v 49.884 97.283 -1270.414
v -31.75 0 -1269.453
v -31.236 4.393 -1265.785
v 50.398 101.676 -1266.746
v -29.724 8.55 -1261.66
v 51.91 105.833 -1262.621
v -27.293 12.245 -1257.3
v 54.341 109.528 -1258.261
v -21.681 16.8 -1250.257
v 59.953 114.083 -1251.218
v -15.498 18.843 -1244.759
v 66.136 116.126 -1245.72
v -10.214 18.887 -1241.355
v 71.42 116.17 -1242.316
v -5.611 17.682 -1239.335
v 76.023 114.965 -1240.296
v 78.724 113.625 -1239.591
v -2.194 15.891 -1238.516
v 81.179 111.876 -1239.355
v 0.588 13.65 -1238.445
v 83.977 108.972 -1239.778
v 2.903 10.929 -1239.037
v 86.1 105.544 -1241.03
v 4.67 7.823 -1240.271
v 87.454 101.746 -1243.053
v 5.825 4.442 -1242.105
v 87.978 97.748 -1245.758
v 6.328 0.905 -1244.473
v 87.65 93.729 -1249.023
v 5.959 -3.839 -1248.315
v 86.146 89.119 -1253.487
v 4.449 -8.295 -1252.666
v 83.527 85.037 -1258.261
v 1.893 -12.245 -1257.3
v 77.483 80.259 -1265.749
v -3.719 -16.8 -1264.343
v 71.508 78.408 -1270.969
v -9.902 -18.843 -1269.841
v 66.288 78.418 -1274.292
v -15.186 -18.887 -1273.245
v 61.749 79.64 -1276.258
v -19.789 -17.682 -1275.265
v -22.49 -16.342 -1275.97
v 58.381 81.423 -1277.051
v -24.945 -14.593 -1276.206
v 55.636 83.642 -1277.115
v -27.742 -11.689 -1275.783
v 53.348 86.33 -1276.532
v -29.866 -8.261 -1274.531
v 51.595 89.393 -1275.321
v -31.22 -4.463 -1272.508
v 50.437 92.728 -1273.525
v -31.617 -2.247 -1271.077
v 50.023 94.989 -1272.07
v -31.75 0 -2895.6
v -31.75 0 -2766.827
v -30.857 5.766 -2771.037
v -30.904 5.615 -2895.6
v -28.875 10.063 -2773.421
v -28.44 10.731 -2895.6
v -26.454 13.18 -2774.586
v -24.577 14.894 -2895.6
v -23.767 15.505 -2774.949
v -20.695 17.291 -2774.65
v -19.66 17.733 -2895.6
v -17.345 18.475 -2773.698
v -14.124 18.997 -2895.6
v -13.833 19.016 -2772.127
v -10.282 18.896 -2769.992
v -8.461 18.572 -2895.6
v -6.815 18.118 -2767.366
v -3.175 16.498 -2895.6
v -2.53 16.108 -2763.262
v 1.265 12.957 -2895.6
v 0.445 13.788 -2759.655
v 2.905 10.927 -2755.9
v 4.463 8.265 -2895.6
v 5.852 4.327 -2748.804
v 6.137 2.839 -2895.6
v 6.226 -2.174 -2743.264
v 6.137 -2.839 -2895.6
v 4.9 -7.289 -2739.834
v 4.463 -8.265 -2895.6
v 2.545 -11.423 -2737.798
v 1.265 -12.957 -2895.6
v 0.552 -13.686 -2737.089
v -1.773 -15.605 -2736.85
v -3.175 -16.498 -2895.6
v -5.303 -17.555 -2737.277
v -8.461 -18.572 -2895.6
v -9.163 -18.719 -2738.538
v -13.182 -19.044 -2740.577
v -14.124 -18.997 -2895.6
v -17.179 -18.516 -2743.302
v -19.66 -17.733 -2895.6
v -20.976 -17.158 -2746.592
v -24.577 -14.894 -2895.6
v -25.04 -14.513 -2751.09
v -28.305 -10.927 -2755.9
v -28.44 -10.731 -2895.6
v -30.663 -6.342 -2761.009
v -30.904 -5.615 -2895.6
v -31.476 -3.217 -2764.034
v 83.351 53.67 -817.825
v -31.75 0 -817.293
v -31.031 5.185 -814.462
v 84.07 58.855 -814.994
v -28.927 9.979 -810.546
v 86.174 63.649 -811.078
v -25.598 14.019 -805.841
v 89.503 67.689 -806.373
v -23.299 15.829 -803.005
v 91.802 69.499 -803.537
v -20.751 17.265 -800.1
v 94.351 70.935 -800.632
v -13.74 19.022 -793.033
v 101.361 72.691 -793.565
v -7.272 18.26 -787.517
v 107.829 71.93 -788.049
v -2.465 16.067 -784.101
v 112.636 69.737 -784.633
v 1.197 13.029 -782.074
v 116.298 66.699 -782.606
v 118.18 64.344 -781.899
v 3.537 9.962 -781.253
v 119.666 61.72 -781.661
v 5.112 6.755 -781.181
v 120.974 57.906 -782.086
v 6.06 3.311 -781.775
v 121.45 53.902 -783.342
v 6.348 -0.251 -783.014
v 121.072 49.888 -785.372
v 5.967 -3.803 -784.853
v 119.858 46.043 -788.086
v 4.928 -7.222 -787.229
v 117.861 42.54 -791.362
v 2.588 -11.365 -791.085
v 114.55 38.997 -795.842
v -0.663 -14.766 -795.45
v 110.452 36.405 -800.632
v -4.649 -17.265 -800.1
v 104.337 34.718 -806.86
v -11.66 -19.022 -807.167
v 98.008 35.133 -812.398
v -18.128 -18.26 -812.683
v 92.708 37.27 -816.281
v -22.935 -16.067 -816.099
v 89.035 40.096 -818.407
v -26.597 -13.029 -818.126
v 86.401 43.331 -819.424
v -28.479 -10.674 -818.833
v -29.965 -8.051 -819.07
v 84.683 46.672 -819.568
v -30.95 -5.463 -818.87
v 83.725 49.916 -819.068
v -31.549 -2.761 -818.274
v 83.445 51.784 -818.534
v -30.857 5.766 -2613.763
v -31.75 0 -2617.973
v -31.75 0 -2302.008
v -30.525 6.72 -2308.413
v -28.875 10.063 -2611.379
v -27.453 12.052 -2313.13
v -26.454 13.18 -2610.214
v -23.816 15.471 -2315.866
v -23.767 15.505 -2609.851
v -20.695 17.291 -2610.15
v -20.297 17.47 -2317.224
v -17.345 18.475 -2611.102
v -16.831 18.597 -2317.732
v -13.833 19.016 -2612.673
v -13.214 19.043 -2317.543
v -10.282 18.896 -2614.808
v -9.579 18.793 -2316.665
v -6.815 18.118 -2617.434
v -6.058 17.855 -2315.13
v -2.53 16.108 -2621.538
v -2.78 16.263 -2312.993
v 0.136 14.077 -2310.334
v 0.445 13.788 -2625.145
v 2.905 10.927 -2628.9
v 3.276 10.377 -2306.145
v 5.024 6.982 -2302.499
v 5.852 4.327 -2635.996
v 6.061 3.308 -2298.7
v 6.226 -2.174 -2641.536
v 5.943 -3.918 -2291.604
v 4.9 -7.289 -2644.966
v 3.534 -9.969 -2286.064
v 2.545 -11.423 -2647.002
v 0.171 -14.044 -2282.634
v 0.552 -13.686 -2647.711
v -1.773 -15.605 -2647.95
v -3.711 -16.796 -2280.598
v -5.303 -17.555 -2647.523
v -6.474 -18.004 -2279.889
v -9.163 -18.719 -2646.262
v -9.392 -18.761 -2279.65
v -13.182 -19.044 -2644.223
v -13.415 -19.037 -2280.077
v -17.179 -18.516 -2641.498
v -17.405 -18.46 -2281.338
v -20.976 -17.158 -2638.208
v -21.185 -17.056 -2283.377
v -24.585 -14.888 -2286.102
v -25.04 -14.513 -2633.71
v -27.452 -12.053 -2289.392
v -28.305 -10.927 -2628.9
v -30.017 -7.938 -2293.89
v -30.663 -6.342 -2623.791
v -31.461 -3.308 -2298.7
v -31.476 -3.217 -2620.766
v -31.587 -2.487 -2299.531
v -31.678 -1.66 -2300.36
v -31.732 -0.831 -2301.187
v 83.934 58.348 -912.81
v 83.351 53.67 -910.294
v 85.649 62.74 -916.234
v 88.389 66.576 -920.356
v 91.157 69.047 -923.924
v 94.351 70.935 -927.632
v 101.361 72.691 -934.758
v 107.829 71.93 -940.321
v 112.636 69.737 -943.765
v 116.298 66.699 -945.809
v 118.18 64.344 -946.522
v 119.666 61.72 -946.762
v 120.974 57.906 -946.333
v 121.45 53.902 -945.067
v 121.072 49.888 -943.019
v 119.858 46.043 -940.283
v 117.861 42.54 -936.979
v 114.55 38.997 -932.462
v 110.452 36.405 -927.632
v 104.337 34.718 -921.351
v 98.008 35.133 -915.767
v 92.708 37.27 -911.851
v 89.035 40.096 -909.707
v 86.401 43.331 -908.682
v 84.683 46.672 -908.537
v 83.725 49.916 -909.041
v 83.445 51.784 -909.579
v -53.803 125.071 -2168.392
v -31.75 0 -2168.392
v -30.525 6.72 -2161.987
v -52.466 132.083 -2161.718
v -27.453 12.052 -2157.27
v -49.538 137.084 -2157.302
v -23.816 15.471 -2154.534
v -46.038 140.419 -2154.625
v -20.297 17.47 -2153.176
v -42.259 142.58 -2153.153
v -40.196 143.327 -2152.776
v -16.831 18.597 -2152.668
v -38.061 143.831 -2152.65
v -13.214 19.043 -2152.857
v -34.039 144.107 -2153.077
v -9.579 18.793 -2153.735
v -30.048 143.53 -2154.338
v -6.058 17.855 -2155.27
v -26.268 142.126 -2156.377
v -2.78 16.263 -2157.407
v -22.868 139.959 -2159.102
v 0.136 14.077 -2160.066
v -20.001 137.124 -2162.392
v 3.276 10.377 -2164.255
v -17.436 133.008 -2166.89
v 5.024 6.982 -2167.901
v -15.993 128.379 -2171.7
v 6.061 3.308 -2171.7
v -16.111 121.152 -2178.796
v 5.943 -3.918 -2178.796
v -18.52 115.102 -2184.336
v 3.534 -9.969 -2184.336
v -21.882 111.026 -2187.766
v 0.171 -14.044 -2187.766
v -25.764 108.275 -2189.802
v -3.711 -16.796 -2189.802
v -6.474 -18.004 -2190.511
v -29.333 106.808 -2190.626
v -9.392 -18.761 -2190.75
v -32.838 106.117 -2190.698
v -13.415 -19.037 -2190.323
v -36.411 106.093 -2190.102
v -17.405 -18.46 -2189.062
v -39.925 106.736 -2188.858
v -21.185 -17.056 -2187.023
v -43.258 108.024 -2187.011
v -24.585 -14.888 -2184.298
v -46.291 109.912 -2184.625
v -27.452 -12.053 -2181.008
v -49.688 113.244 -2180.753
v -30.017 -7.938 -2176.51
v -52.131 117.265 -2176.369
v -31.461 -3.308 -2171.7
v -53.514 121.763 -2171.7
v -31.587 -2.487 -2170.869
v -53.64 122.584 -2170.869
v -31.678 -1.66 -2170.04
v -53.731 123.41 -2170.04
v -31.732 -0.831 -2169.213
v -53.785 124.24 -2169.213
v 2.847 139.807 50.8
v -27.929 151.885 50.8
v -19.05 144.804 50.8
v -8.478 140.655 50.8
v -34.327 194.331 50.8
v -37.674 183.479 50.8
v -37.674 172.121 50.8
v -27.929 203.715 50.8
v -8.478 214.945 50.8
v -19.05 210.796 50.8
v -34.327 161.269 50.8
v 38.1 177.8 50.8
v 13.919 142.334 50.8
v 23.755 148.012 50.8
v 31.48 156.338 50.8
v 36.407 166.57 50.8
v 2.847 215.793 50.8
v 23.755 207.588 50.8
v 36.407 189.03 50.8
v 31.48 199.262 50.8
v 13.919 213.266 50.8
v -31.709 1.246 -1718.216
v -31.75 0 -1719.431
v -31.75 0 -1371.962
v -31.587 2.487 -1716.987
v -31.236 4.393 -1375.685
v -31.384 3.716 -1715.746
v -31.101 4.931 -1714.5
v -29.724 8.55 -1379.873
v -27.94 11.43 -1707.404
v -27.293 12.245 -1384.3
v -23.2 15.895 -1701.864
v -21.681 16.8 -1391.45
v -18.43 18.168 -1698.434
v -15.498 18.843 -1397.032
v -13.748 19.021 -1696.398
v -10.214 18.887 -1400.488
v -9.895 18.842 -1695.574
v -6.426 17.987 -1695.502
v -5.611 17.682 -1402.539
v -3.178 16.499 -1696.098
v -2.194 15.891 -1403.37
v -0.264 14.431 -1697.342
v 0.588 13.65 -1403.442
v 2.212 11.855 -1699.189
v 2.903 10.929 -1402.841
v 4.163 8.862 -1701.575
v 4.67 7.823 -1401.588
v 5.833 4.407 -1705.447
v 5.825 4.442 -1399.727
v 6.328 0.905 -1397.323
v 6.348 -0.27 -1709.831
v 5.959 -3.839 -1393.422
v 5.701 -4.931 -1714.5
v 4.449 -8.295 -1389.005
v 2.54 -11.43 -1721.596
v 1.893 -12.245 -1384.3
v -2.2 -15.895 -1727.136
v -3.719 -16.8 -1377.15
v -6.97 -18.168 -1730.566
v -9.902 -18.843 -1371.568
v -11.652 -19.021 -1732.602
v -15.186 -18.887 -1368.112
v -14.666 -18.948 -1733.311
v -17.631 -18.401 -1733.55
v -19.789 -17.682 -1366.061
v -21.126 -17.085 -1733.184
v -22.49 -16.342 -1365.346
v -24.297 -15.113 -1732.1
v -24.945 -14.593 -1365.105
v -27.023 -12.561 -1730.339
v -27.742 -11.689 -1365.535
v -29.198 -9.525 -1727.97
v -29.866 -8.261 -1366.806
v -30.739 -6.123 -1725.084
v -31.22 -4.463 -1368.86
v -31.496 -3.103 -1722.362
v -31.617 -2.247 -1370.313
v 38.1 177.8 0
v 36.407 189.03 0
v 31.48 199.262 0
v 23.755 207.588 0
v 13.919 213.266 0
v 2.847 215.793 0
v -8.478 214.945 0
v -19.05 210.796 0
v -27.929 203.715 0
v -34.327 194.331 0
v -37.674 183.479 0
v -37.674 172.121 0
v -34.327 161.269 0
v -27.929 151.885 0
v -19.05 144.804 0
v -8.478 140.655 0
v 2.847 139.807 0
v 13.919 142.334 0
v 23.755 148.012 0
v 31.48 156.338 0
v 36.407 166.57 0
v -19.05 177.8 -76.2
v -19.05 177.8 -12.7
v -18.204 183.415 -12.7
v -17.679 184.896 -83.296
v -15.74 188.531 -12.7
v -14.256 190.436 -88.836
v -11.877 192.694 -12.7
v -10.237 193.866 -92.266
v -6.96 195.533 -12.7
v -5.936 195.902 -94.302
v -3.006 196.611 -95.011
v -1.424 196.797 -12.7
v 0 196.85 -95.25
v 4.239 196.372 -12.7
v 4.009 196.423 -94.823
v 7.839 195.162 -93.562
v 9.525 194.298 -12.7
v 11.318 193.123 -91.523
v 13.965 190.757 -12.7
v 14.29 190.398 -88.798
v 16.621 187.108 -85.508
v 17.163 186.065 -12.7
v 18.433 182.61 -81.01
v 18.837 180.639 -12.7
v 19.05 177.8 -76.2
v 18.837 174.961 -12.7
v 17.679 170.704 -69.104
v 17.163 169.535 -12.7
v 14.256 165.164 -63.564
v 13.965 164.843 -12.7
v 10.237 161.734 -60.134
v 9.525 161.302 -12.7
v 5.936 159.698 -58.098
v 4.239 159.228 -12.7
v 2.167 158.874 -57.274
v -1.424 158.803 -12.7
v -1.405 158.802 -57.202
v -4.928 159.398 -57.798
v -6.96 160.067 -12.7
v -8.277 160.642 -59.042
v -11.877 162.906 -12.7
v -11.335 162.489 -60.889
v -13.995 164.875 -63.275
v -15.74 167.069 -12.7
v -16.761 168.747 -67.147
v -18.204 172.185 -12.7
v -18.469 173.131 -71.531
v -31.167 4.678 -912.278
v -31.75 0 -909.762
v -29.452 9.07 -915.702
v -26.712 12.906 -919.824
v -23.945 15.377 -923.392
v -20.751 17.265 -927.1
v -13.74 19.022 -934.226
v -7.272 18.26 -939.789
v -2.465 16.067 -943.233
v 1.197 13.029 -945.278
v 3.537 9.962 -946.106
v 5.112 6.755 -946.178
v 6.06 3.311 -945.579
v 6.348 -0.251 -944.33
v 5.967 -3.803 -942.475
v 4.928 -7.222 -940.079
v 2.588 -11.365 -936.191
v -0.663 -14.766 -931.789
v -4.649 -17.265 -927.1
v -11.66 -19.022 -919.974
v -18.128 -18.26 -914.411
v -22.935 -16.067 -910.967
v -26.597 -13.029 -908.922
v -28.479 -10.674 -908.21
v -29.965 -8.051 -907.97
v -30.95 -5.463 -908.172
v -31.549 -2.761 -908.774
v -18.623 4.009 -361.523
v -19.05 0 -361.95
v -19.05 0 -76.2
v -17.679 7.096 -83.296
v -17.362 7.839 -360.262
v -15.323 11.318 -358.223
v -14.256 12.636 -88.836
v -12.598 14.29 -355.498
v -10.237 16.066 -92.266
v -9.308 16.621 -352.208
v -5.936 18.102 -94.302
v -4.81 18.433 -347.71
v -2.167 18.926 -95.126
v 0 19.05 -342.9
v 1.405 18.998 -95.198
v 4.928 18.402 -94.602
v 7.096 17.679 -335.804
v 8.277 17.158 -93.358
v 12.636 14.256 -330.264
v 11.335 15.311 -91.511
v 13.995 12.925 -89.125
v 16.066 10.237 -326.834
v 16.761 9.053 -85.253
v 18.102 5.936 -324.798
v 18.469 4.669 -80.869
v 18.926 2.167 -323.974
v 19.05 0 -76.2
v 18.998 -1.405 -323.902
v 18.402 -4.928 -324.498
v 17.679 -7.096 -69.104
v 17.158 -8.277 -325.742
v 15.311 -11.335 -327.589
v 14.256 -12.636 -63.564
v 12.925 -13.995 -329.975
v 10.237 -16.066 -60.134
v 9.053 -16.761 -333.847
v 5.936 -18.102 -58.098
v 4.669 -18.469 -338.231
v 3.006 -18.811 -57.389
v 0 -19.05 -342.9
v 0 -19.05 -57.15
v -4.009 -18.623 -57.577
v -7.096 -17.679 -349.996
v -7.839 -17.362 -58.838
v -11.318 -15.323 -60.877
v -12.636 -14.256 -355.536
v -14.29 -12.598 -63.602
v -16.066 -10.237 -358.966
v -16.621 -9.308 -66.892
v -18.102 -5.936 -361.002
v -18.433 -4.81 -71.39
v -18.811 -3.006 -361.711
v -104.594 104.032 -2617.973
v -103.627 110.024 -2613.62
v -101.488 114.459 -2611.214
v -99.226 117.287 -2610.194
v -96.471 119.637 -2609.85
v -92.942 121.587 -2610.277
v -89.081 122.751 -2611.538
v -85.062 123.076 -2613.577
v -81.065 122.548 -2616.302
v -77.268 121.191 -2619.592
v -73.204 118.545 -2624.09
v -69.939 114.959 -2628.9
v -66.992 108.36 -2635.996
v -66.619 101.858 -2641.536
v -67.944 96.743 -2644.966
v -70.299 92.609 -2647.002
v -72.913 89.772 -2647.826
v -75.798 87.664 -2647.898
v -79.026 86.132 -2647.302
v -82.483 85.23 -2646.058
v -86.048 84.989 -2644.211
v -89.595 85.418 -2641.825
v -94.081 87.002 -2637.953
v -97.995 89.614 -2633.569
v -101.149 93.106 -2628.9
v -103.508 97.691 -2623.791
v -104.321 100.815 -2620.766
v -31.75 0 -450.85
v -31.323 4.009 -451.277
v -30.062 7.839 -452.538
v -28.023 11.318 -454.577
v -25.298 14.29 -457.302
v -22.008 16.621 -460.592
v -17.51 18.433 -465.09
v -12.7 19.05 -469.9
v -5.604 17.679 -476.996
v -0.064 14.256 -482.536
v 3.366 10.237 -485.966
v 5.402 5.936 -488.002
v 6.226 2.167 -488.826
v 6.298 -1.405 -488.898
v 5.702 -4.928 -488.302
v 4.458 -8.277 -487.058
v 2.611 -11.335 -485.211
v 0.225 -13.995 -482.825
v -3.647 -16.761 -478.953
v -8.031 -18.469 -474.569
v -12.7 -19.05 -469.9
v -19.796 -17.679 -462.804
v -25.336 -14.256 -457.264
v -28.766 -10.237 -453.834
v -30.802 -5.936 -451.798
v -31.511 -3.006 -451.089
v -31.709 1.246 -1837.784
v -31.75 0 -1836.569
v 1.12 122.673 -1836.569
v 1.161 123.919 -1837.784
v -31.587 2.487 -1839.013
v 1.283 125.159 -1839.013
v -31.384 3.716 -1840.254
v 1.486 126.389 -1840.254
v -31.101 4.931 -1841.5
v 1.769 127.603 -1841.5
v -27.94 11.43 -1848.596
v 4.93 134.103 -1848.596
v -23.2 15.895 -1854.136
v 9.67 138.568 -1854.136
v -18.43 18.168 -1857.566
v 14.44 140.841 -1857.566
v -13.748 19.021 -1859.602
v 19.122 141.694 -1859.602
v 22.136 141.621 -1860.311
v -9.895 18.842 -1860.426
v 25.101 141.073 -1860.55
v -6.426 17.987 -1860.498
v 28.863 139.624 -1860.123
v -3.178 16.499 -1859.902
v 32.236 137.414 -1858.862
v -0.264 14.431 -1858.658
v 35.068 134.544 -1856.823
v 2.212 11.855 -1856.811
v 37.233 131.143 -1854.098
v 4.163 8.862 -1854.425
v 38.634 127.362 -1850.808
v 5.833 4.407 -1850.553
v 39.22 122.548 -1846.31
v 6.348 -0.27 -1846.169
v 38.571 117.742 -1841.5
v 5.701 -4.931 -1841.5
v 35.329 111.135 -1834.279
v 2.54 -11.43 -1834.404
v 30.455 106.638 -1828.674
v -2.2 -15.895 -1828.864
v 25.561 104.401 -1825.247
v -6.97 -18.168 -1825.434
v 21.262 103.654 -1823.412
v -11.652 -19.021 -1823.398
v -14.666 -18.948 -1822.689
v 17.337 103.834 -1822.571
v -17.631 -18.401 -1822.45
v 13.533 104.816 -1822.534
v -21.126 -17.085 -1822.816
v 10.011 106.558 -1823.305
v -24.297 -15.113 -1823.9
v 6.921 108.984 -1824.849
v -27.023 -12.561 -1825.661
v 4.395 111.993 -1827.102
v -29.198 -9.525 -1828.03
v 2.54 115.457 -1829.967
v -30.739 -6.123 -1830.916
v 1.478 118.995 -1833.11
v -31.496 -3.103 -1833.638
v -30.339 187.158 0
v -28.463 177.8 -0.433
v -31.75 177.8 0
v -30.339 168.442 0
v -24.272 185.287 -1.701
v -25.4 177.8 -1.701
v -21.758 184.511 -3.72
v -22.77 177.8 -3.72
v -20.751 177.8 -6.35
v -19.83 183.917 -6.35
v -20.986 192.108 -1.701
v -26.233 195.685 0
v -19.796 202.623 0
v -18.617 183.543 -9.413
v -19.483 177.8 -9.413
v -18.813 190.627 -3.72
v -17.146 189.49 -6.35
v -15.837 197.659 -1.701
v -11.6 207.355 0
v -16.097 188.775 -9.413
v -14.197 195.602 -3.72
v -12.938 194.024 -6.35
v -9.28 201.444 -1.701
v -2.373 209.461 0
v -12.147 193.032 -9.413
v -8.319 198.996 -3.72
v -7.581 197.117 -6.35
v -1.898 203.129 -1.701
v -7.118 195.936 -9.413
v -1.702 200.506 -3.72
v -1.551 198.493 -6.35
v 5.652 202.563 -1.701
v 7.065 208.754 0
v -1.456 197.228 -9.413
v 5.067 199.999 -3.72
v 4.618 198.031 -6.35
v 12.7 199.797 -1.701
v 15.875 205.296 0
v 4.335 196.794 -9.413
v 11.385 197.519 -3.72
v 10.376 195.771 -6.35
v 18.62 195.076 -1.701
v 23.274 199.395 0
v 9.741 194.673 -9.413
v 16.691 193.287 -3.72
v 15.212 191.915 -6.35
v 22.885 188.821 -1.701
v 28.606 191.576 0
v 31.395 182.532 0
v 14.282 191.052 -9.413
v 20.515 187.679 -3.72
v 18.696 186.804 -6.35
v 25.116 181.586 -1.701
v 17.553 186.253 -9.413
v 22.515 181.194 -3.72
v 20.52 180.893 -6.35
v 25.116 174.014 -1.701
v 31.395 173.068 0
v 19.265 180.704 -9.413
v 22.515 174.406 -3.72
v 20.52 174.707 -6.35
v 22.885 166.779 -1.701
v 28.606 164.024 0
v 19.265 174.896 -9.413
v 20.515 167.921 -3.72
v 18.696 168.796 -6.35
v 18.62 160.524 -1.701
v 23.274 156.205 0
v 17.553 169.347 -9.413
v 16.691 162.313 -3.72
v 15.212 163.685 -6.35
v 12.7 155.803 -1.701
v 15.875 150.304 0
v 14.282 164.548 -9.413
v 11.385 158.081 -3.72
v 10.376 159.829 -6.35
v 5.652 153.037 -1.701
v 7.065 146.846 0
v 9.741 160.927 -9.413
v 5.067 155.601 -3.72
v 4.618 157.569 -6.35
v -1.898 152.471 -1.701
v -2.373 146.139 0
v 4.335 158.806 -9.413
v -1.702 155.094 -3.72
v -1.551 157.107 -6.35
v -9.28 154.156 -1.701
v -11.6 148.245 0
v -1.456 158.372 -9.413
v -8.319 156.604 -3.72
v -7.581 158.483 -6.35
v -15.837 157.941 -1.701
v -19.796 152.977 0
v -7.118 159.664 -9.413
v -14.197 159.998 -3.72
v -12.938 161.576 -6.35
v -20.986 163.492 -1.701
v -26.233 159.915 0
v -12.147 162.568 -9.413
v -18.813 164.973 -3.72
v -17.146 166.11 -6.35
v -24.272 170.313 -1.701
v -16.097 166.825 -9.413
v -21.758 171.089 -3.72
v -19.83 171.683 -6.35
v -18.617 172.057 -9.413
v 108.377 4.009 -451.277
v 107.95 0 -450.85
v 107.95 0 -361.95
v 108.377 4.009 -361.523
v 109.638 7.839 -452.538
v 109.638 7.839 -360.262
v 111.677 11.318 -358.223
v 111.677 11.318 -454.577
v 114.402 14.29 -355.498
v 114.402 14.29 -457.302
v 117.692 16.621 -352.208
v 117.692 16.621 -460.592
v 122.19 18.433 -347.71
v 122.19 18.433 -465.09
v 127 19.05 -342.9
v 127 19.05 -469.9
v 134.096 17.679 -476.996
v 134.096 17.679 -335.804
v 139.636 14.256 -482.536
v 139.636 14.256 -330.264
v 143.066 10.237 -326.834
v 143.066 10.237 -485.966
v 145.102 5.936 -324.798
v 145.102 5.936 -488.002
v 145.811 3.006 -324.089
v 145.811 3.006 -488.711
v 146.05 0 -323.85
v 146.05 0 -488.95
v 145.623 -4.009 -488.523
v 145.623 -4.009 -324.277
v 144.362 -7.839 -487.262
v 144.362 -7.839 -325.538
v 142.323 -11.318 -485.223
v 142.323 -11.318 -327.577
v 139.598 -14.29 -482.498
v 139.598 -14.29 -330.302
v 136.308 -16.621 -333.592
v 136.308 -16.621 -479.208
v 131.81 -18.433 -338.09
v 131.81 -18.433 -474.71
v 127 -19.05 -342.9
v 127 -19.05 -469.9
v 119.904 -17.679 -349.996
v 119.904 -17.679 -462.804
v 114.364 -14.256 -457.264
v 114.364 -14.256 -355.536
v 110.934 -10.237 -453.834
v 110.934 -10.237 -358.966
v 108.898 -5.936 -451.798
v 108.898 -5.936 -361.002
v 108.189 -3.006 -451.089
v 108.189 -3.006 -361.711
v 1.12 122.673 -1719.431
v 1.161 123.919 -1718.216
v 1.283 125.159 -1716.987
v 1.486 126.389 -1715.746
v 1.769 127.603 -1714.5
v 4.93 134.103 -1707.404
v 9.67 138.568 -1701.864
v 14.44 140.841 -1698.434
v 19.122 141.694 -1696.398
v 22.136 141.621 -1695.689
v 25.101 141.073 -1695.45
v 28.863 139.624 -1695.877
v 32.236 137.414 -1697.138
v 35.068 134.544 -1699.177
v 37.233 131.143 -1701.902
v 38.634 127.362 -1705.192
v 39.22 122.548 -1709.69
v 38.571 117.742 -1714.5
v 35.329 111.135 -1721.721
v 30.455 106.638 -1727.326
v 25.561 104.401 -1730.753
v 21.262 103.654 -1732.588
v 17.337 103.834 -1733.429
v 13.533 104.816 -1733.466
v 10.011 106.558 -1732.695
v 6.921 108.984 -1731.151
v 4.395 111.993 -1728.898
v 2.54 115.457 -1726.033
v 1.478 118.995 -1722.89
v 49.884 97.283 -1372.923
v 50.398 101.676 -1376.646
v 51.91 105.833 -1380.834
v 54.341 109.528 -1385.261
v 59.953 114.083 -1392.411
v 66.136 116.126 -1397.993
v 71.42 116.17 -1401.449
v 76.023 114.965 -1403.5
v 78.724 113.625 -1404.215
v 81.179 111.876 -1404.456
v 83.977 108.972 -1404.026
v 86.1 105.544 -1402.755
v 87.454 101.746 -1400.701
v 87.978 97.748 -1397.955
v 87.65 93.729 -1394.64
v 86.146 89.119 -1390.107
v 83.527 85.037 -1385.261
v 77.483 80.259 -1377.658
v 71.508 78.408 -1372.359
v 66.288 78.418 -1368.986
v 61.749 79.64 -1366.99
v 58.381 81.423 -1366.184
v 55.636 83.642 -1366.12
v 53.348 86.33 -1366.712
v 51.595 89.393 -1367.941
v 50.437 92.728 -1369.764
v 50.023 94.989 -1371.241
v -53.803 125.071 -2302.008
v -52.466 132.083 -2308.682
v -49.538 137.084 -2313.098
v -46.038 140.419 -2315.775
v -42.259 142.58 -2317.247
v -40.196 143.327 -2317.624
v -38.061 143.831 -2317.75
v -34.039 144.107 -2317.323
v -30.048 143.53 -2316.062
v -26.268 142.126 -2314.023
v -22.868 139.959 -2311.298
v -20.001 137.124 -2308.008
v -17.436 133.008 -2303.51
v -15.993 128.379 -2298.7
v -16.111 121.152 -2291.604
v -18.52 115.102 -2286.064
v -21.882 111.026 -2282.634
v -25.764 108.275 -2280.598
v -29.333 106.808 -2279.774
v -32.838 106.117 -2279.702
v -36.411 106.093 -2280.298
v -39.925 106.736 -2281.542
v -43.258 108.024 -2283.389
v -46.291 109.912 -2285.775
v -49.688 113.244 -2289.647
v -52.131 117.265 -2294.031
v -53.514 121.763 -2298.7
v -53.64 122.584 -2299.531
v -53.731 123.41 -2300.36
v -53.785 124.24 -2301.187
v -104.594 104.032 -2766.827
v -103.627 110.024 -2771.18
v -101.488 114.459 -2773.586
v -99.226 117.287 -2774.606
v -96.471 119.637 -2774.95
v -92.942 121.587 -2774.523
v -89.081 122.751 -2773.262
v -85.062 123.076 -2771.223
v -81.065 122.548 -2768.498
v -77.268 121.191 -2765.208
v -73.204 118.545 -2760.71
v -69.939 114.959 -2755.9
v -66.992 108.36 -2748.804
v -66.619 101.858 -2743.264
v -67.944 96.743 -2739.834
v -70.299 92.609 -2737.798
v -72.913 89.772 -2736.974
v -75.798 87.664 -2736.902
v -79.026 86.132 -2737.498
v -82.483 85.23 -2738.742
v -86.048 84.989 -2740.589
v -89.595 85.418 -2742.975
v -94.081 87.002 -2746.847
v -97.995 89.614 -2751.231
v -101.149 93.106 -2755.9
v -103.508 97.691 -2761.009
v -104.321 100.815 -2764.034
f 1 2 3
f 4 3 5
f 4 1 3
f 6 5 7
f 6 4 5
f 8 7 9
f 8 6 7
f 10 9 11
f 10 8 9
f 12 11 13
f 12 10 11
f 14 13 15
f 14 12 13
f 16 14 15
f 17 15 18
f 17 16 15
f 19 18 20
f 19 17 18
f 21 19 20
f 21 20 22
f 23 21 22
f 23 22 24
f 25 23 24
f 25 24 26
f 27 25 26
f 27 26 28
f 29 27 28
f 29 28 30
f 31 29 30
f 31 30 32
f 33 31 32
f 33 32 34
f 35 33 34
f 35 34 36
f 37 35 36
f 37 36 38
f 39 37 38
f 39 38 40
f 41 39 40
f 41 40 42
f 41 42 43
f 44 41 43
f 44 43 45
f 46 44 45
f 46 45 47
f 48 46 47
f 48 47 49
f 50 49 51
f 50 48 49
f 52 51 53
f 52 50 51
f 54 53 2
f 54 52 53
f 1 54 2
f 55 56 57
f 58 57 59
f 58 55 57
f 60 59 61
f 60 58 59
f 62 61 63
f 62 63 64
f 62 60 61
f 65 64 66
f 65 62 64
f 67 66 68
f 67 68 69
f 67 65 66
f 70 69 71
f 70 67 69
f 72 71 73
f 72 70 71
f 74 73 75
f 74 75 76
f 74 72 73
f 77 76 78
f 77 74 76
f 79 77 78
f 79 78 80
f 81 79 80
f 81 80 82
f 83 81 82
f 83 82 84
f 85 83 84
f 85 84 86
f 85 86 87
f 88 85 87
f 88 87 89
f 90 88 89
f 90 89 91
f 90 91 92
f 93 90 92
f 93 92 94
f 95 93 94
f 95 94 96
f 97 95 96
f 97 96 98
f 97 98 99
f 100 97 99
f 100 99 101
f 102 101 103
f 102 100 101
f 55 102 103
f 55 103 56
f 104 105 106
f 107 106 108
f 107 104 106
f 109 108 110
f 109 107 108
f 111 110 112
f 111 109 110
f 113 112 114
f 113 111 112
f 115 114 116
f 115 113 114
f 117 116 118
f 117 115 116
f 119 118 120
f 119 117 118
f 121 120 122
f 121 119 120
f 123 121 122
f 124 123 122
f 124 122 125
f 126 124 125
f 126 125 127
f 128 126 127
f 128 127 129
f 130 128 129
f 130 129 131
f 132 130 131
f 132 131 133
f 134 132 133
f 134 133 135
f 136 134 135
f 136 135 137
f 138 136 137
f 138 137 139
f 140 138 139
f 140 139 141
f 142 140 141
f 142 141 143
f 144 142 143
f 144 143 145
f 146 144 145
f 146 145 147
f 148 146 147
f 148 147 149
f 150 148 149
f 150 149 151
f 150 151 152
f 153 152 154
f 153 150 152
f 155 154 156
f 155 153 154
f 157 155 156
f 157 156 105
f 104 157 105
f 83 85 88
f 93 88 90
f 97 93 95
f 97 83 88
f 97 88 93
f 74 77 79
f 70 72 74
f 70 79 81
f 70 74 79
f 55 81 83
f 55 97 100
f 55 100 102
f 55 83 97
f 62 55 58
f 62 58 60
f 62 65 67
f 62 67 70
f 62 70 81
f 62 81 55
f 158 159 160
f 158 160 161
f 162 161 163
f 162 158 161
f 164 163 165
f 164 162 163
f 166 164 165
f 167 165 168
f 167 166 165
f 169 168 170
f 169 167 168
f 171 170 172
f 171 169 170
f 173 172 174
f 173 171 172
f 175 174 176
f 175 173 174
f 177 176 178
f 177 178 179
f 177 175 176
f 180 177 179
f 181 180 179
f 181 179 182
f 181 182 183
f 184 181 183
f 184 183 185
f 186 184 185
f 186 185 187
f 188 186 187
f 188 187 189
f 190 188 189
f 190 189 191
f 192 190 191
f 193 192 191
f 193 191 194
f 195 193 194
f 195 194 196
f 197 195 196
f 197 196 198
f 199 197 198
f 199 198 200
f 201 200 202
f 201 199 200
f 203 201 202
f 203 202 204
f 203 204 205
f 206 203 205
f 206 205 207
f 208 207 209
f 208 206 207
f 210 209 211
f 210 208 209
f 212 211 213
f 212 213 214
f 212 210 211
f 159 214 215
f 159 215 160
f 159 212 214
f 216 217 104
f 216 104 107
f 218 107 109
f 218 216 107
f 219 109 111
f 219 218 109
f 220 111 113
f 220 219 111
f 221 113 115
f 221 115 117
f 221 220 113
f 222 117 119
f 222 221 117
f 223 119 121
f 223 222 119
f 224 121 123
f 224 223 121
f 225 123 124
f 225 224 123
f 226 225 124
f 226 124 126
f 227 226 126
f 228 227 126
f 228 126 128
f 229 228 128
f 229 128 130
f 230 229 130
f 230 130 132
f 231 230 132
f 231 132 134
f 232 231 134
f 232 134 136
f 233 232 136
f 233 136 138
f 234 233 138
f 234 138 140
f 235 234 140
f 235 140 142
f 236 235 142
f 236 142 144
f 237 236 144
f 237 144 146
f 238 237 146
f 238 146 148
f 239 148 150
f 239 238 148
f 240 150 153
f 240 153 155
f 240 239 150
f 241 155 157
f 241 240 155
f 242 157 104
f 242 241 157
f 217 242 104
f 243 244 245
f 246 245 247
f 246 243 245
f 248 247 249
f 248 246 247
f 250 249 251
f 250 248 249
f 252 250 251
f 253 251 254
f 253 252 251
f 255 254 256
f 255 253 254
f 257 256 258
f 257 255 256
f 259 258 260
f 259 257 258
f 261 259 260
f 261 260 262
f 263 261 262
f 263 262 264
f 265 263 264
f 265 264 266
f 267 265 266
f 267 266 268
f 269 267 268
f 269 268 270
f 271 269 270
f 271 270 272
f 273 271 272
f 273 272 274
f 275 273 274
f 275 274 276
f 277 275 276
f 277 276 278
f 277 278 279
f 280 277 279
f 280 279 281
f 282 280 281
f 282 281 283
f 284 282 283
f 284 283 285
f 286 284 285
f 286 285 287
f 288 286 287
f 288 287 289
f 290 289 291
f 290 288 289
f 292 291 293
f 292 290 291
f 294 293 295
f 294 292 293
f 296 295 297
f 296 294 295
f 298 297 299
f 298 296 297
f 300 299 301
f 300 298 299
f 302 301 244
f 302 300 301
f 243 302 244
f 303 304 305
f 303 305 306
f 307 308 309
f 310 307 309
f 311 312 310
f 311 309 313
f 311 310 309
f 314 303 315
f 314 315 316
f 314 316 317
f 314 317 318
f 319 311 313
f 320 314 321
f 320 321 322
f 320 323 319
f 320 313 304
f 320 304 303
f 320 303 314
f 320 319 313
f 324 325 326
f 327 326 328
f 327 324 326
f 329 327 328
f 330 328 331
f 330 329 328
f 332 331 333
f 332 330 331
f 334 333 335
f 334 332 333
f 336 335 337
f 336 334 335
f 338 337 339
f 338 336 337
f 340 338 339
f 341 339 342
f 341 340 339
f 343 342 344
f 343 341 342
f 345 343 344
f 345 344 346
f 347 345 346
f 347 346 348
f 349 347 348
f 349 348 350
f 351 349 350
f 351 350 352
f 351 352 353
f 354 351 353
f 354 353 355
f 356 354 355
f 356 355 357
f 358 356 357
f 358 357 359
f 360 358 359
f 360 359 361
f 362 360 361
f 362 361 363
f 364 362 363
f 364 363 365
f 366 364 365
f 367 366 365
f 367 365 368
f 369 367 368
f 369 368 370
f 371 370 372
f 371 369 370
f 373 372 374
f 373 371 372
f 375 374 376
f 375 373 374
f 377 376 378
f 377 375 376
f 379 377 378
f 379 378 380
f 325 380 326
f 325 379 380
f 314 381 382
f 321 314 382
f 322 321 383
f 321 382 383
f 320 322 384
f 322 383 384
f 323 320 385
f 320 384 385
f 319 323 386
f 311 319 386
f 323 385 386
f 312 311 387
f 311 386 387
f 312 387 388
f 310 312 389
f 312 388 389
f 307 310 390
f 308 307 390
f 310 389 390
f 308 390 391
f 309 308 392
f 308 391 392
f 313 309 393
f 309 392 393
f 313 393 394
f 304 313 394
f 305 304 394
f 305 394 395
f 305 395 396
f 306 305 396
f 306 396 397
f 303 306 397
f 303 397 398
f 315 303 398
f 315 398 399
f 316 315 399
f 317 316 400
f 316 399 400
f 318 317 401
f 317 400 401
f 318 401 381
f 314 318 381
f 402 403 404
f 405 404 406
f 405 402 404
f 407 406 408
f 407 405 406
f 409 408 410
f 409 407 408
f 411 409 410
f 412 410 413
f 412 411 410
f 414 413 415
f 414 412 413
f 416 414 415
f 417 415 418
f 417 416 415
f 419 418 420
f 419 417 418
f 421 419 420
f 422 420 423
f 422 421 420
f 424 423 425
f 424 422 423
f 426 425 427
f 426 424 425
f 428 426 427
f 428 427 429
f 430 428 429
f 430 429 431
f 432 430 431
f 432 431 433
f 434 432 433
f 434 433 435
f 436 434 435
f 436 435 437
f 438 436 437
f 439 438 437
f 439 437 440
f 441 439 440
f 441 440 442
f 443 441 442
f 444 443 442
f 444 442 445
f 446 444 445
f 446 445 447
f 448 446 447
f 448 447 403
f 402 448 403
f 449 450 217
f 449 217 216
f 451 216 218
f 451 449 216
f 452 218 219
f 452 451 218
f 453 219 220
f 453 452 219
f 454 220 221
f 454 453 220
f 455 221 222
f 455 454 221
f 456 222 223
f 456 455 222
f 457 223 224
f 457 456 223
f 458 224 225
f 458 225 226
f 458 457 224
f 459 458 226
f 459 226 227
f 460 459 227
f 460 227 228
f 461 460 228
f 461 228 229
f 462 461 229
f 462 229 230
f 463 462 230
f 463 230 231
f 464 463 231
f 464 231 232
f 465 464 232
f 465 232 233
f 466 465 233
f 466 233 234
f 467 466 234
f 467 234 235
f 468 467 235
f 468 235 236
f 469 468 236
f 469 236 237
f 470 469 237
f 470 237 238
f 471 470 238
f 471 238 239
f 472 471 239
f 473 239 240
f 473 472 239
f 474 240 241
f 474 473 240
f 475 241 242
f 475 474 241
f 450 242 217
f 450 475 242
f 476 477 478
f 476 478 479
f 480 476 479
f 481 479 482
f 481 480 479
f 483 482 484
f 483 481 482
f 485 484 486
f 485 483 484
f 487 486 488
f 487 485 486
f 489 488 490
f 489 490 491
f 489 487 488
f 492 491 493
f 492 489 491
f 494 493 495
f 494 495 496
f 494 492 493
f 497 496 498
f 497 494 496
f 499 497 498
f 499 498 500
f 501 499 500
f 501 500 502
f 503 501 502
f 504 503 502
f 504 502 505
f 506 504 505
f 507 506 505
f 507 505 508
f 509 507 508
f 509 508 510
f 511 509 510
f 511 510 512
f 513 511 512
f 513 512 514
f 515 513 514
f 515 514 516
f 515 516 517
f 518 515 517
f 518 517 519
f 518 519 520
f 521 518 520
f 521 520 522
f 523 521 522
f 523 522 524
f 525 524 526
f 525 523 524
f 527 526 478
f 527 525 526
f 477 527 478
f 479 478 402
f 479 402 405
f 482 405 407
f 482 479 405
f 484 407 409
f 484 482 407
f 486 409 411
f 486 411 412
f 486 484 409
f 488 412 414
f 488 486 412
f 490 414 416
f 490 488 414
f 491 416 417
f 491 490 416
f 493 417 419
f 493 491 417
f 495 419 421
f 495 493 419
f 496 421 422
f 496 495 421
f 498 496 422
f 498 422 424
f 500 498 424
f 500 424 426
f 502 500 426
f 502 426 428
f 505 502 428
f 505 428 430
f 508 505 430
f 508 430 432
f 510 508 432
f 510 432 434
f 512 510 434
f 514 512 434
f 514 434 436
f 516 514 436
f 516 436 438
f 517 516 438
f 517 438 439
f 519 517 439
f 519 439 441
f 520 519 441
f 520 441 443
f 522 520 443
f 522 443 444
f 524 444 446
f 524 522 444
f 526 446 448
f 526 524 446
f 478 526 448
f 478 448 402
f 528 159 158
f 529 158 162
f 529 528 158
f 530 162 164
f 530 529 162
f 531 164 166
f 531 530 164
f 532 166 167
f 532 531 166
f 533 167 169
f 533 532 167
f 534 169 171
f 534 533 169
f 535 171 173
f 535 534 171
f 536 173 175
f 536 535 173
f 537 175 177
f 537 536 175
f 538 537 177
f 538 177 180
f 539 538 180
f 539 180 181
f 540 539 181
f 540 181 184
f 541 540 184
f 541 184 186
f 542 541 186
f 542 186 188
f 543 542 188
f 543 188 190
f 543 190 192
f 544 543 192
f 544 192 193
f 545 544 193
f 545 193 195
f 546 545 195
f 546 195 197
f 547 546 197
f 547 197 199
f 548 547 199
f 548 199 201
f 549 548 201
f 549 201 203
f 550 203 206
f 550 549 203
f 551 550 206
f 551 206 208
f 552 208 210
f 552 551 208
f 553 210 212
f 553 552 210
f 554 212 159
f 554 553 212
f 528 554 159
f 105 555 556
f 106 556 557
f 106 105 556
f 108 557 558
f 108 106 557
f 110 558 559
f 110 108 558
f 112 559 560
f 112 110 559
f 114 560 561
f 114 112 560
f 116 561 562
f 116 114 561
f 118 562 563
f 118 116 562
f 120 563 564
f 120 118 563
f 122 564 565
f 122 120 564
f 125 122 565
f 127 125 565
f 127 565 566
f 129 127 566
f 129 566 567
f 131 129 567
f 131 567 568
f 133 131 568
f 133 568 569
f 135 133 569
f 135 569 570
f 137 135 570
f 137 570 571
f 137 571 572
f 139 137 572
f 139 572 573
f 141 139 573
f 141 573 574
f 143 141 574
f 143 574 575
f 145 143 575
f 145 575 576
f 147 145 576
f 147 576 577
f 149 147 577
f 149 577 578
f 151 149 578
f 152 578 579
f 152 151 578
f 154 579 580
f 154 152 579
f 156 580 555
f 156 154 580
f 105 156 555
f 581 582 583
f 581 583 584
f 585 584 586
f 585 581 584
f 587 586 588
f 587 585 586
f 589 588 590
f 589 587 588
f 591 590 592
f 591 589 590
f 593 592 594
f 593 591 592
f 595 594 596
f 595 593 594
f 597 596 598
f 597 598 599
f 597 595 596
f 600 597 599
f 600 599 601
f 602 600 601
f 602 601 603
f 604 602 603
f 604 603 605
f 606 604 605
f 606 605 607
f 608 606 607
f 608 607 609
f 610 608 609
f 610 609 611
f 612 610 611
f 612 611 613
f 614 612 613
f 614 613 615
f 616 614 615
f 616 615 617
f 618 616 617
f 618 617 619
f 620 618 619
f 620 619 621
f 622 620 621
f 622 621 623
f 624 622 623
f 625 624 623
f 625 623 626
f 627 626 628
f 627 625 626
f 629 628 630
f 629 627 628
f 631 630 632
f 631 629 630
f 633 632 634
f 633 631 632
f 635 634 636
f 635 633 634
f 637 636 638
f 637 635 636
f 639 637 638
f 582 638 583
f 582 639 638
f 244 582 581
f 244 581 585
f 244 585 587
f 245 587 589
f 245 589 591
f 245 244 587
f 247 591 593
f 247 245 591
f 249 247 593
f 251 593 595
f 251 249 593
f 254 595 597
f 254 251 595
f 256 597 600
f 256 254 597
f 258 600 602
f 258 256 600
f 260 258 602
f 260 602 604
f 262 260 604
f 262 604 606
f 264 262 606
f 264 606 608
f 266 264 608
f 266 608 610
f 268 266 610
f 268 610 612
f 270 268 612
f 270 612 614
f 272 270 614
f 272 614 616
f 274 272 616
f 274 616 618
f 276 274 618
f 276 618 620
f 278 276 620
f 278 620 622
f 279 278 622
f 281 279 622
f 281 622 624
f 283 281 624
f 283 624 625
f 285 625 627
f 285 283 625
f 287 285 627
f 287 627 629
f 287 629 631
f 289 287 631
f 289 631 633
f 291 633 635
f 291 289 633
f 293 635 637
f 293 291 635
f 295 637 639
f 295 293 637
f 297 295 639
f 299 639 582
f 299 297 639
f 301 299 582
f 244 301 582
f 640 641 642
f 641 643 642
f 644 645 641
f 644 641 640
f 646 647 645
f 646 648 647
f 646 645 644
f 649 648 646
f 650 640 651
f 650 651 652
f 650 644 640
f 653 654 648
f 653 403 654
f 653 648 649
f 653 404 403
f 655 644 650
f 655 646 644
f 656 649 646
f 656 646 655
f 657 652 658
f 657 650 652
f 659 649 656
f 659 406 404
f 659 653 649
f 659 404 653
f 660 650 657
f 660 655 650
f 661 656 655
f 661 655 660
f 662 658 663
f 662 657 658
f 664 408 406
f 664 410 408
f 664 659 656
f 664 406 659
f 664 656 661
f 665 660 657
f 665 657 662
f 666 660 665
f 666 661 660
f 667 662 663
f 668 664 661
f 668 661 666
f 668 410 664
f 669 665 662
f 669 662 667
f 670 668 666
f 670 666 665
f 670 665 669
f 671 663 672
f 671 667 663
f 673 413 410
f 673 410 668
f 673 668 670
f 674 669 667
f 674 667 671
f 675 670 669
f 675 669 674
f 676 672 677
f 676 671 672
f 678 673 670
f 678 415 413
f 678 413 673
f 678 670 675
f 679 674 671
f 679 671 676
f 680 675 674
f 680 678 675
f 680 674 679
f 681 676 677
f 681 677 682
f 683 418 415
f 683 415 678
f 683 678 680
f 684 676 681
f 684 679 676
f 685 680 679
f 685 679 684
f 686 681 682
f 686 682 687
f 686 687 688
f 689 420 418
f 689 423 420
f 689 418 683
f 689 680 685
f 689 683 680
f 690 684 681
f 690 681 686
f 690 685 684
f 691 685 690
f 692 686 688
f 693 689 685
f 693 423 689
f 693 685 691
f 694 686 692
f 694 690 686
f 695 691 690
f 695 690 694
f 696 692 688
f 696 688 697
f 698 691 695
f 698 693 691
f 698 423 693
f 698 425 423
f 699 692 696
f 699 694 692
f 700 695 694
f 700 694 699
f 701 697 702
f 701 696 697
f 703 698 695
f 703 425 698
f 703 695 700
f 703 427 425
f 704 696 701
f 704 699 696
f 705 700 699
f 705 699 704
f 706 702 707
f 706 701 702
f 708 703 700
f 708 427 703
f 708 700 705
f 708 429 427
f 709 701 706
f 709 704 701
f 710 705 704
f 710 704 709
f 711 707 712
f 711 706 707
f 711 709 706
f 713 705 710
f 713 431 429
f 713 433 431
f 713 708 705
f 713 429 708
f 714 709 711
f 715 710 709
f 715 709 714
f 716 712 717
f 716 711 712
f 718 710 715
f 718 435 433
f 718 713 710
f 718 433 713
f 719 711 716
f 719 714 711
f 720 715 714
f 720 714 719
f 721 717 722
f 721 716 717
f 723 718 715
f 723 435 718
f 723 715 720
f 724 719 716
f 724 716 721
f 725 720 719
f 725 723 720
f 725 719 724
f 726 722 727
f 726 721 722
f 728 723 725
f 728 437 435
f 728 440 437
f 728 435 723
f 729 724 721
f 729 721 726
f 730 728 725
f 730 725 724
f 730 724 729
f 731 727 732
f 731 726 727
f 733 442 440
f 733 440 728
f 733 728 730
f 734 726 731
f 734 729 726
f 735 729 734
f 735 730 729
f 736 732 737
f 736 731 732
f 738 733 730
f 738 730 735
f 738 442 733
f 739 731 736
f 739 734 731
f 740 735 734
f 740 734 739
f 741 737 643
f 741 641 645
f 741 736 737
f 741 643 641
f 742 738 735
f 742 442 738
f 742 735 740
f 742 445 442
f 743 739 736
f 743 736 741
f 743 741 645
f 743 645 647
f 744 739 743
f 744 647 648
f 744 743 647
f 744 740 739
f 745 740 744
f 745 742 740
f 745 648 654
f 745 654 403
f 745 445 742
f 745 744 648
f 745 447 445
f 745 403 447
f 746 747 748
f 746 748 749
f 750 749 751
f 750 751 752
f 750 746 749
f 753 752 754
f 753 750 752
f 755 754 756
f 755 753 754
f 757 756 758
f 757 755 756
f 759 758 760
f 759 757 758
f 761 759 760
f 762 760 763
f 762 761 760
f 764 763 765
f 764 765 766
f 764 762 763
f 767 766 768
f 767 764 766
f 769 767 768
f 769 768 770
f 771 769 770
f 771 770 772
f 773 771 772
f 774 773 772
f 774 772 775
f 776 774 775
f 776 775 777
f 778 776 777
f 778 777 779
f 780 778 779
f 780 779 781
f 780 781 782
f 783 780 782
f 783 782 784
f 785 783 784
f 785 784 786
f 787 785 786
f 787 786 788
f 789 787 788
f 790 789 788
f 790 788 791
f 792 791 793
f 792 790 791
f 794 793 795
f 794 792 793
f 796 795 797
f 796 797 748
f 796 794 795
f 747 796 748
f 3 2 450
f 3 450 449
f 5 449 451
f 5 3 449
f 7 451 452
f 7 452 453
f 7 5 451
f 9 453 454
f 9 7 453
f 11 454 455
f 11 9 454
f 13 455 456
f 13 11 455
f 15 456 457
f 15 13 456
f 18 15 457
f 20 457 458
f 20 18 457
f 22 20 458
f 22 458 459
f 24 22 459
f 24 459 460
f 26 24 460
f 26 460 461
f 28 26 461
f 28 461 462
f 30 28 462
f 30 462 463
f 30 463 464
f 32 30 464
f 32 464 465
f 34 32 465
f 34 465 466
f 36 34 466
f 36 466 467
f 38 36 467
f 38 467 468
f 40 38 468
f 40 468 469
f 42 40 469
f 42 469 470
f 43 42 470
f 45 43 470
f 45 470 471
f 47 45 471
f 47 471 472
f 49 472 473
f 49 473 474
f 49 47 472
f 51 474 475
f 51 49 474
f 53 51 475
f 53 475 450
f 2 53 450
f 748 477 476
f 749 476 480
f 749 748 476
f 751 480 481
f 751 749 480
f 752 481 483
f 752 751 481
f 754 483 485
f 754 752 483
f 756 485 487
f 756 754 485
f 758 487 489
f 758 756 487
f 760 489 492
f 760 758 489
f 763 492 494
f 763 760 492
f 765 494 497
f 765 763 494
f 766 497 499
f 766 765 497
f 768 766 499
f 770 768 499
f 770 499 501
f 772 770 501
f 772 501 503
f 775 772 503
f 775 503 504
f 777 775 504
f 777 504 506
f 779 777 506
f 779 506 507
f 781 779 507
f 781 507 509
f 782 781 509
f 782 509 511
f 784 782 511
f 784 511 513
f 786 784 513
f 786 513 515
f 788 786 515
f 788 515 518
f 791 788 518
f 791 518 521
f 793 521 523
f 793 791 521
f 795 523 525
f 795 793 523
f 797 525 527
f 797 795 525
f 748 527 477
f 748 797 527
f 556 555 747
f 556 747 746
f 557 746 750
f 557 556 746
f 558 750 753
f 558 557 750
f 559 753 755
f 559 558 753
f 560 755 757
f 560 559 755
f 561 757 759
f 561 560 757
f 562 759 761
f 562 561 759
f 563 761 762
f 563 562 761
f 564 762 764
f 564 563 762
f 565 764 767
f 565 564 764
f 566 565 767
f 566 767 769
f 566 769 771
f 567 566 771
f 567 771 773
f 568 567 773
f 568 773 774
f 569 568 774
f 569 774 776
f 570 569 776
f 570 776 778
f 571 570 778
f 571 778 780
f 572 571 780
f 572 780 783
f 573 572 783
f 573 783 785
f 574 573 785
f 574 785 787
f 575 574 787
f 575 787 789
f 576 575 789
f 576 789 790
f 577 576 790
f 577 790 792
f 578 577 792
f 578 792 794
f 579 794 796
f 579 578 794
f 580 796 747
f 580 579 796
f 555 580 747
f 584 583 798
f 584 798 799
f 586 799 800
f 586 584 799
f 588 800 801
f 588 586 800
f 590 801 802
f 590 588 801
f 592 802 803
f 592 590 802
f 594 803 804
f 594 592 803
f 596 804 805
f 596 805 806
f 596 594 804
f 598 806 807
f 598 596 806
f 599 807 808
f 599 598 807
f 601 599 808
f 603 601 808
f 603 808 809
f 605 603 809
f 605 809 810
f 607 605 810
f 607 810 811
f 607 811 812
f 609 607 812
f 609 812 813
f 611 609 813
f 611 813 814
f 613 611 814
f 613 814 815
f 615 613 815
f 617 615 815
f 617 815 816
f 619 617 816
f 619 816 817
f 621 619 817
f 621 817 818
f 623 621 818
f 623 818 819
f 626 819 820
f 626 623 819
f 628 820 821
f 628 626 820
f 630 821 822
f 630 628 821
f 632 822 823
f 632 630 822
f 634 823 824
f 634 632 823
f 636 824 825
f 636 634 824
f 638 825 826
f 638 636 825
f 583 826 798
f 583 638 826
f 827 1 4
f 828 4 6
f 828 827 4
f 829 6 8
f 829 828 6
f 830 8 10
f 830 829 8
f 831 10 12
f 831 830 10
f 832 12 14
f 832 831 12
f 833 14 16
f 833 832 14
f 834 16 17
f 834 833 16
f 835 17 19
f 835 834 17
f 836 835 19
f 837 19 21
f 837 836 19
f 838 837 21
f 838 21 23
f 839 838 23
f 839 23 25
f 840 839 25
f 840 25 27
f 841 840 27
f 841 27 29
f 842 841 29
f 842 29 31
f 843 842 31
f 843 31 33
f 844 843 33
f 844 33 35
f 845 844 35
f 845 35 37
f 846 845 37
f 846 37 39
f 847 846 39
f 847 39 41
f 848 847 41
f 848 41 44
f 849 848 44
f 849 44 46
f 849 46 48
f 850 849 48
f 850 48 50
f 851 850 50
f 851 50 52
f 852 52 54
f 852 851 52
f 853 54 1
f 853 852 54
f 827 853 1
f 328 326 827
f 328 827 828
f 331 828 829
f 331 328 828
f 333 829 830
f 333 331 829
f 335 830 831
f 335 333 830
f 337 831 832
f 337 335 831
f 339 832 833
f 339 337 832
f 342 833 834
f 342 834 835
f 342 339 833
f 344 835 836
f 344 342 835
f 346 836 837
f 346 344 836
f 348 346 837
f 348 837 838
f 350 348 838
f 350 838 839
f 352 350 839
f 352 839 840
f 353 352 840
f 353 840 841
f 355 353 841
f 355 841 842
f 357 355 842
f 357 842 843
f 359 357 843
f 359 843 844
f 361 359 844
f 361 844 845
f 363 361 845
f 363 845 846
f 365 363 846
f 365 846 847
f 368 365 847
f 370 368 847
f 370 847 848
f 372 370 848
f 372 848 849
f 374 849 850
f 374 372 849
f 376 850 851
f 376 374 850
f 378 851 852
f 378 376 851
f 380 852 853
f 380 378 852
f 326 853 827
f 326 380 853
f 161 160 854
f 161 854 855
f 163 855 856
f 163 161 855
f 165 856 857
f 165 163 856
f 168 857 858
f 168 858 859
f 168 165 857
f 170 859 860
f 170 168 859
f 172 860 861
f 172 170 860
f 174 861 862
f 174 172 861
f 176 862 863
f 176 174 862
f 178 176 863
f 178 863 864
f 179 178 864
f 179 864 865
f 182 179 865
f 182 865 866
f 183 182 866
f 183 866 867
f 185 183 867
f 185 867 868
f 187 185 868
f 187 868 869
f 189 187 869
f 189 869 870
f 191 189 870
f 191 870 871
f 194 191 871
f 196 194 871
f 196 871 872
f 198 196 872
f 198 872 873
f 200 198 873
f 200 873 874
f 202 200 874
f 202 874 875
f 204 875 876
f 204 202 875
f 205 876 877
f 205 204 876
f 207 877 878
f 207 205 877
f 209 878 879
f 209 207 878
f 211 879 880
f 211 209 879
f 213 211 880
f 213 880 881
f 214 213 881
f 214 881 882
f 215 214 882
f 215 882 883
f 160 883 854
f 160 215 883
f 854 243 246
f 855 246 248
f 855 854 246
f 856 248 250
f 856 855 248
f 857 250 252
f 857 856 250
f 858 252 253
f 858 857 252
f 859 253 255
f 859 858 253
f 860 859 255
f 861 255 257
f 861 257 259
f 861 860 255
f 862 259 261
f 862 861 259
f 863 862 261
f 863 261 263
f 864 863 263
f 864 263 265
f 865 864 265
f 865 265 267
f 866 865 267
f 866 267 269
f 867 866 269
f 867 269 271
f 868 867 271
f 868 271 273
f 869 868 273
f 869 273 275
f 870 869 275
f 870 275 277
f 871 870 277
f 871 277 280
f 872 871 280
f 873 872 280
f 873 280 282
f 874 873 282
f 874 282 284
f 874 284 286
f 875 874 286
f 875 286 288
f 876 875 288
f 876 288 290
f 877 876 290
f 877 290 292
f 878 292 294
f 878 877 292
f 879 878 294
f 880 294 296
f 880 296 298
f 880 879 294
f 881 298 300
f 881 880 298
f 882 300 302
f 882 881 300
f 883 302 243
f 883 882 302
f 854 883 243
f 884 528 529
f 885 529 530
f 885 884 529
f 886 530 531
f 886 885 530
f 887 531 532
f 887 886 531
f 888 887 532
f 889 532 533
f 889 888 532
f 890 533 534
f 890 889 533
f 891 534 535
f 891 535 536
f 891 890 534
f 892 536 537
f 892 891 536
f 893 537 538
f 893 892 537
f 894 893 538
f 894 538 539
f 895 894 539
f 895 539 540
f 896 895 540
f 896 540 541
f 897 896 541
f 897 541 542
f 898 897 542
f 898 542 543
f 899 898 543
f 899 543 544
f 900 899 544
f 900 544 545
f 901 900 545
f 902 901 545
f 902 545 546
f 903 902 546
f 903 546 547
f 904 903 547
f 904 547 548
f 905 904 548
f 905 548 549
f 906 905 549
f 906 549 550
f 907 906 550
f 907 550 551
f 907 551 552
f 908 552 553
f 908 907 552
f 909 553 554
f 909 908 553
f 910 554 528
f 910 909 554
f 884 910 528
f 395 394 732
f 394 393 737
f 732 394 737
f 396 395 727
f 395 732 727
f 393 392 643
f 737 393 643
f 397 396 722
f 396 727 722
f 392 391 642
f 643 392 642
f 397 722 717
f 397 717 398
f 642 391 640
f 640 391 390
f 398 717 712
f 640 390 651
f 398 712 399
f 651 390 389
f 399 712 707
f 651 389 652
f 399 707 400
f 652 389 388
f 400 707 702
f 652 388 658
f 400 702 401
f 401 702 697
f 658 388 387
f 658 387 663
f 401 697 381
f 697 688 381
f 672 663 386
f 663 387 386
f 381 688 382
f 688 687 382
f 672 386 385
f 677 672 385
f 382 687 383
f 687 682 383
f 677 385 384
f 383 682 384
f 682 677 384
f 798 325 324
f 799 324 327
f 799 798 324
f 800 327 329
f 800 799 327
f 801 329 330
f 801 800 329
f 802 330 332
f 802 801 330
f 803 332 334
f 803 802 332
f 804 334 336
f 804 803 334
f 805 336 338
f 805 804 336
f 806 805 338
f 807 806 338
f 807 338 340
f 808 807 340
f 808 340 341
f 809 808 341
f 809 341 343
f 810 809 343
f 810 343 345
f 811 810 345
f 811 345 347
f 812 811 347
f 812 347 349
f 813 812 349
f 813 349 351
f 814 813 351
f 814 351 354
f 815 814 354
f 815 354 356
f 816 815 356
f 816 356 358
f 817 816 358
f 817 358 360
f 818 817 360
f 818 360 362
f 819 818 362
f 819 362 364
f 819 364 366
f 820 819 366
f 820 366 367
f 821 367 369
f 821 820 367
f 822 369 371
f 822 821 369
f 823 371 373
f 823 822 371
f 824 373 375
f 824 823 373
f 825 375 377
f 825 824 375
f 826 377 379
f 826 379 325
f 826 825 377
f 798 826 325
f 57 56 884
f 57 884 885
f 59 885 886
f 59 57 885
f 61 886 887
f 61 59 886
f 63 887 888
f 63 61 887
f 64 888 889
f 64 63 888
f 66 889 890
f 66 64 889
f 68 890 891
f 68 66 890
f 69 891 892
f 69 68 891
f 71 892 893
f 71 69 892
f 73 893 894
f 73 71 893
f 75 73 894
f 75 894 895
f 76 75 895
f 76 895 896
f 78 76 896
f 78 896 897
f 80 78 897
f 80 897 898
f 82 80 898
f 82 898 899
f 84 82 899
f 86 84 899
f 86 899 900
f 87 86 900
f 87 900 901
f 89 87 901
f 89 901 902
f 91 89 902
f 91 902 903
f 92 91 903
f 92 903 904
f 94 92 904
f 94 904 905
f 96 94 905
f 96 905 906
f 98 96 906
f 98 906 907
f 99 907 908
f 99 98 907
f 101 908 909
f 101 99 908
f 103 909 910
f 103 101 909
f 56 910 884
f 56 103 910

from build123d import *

# Parameters (mm, degrees)
SKETCH3_R           = 38.1
BOSS_EXTRUDE2_DEPTH = 50.8
SKETCH4_R           = 19.05
FILLET1_R           = 12.7
SKETCH5_R           = 19.05


with BuildPart() as part:
    # Sketch3 → Boss-Extrude2 (new body)
    with BuildSketch(Plane.XY):
        with Locations((0, 177.8)):
            Circle(SKETCH3_R)
    extrude(amount=BOSS_EXTRUDE2_DEPTH)

    # Sweep1: sweep along a curve in space
    with BuildLine() as sweep1_path:
        Line((0, 177.8, 0), (0, 177.8, -76.2))
        Line((0, 177.8, -76.2), (0, 0, -76.2))
        Line((0, 0, -76.2), (0, 0, -177.8))
    # Sketch4 → Sweep1 (sweep)
    with BuildSketch(Plane(origin=(0, 0, 0), x_dir=(-1, 0, 0), z_dir=(0, 0, -1))):
        with Locations((0, 177.8)):
            Circle(SKETCH4_R)
    sweep(path=sweep1_path.line, transition=Transition.RIGHT)

    # Fillet1
    fillet1_edges = [part.edges().sort_by_distance(p)[0] for p in [
        (19.05, 177.8, 0),
    ]]
    fillet(fillet1_edges, radius=FILLET1_R)

    # Sweep2: sweep along a curve in space
    with BuildLine() as sweep2_path:
        Line((0, 0, -177.8), (0, 0, -342.9))
        Line((0, 0, -342.9), (127, 0, -342.9))
        Line((127, 0, -342.9), (127, 0, -469.9))
        Line((127, 0, -469.9), (-12.7, 0, -469.9))
        Line((-12.7, 0, -469.9), (-12.7, 0, -800.1))
        Line((-12.7, 0, -800.1), (102.401088954, 53.669884385, -800.631819274))
        Line((102.401088954, 53.669884385, -800.631819274), (102.401088954, 53.669884385, -927.631819274))
        Line((-12.7, 0, -927.1), (102.401088954, 53.669884385, -927.631819274))
        Line((-12.7, 0, -927.1), (-12.7, 0, -1257.3))
        Line((-12.7, 0, -1257.3), (68.93402643, 97.28289786, -1258.260995676))
        Line((68.93402643, 97.28289786, -1258.260995676), (68.93402643, 97.28289786, -1385.260995676))
        Line((-12.7, 0, -1384.3), (68.93402643, 97.28289786, -1385.260995676))
        Line((-12.7, 0, -1384.3), (-12.7, 0, -1714.5))
        Line((-12.7, 0, -1714.5), (20.170018728, 122.672579939, -1714.5))
        Line((20.170018728, 122.672579939, -1714.5), (20.170018728, 122.672579939, -1841.5))
        Line((-12.7, 0, -1841.5), (20.170018728, 122.672579939, -1841.5))
        Line((-12.7, 0, -1841.5), (-12.7, 0, -2171.7))
        Line((-12.7, 0, -2171.7), (-34.753318564, 125.070584633, -2171.7))
        Line((-34.753318564, 125.070584633, -2171.7), (-34.753318564, 125.070584633, -2298.7))
        Line((-12.7, 0, -2298.7), (-34.753318564, 125.070584633, -2298.7))
        Line((-12.7, 0, -2298.7), (-12.7, 0, -2628.9))
        Line((-12.7, 0, -2628.9), (-85.544207417, 104.032309625, -2628.9))
        Line((-85.544207417, 104.032309625, -2628.9), (-85.544207417, 104.032309625, -2755.9))
        Line((-12.7, 0, -2755.9), (-85.544207417, 104.032309625, -2755.9))
        Line((-12.7, 0, -2755.9), (-12.7, 0, -2895.6))
    # Sketch5 → Sweep2 (sweep)
    with BuildSketch(Plane(origin=(0, 0, -177.8), x_dir=(-1, 0, 0), z_dir=(0, 0, -1))):
        Circle(SKETCH5_R)
    sweep(path=sweep2_path.line, transition=Transition.RIGHT)


solid = part.part
